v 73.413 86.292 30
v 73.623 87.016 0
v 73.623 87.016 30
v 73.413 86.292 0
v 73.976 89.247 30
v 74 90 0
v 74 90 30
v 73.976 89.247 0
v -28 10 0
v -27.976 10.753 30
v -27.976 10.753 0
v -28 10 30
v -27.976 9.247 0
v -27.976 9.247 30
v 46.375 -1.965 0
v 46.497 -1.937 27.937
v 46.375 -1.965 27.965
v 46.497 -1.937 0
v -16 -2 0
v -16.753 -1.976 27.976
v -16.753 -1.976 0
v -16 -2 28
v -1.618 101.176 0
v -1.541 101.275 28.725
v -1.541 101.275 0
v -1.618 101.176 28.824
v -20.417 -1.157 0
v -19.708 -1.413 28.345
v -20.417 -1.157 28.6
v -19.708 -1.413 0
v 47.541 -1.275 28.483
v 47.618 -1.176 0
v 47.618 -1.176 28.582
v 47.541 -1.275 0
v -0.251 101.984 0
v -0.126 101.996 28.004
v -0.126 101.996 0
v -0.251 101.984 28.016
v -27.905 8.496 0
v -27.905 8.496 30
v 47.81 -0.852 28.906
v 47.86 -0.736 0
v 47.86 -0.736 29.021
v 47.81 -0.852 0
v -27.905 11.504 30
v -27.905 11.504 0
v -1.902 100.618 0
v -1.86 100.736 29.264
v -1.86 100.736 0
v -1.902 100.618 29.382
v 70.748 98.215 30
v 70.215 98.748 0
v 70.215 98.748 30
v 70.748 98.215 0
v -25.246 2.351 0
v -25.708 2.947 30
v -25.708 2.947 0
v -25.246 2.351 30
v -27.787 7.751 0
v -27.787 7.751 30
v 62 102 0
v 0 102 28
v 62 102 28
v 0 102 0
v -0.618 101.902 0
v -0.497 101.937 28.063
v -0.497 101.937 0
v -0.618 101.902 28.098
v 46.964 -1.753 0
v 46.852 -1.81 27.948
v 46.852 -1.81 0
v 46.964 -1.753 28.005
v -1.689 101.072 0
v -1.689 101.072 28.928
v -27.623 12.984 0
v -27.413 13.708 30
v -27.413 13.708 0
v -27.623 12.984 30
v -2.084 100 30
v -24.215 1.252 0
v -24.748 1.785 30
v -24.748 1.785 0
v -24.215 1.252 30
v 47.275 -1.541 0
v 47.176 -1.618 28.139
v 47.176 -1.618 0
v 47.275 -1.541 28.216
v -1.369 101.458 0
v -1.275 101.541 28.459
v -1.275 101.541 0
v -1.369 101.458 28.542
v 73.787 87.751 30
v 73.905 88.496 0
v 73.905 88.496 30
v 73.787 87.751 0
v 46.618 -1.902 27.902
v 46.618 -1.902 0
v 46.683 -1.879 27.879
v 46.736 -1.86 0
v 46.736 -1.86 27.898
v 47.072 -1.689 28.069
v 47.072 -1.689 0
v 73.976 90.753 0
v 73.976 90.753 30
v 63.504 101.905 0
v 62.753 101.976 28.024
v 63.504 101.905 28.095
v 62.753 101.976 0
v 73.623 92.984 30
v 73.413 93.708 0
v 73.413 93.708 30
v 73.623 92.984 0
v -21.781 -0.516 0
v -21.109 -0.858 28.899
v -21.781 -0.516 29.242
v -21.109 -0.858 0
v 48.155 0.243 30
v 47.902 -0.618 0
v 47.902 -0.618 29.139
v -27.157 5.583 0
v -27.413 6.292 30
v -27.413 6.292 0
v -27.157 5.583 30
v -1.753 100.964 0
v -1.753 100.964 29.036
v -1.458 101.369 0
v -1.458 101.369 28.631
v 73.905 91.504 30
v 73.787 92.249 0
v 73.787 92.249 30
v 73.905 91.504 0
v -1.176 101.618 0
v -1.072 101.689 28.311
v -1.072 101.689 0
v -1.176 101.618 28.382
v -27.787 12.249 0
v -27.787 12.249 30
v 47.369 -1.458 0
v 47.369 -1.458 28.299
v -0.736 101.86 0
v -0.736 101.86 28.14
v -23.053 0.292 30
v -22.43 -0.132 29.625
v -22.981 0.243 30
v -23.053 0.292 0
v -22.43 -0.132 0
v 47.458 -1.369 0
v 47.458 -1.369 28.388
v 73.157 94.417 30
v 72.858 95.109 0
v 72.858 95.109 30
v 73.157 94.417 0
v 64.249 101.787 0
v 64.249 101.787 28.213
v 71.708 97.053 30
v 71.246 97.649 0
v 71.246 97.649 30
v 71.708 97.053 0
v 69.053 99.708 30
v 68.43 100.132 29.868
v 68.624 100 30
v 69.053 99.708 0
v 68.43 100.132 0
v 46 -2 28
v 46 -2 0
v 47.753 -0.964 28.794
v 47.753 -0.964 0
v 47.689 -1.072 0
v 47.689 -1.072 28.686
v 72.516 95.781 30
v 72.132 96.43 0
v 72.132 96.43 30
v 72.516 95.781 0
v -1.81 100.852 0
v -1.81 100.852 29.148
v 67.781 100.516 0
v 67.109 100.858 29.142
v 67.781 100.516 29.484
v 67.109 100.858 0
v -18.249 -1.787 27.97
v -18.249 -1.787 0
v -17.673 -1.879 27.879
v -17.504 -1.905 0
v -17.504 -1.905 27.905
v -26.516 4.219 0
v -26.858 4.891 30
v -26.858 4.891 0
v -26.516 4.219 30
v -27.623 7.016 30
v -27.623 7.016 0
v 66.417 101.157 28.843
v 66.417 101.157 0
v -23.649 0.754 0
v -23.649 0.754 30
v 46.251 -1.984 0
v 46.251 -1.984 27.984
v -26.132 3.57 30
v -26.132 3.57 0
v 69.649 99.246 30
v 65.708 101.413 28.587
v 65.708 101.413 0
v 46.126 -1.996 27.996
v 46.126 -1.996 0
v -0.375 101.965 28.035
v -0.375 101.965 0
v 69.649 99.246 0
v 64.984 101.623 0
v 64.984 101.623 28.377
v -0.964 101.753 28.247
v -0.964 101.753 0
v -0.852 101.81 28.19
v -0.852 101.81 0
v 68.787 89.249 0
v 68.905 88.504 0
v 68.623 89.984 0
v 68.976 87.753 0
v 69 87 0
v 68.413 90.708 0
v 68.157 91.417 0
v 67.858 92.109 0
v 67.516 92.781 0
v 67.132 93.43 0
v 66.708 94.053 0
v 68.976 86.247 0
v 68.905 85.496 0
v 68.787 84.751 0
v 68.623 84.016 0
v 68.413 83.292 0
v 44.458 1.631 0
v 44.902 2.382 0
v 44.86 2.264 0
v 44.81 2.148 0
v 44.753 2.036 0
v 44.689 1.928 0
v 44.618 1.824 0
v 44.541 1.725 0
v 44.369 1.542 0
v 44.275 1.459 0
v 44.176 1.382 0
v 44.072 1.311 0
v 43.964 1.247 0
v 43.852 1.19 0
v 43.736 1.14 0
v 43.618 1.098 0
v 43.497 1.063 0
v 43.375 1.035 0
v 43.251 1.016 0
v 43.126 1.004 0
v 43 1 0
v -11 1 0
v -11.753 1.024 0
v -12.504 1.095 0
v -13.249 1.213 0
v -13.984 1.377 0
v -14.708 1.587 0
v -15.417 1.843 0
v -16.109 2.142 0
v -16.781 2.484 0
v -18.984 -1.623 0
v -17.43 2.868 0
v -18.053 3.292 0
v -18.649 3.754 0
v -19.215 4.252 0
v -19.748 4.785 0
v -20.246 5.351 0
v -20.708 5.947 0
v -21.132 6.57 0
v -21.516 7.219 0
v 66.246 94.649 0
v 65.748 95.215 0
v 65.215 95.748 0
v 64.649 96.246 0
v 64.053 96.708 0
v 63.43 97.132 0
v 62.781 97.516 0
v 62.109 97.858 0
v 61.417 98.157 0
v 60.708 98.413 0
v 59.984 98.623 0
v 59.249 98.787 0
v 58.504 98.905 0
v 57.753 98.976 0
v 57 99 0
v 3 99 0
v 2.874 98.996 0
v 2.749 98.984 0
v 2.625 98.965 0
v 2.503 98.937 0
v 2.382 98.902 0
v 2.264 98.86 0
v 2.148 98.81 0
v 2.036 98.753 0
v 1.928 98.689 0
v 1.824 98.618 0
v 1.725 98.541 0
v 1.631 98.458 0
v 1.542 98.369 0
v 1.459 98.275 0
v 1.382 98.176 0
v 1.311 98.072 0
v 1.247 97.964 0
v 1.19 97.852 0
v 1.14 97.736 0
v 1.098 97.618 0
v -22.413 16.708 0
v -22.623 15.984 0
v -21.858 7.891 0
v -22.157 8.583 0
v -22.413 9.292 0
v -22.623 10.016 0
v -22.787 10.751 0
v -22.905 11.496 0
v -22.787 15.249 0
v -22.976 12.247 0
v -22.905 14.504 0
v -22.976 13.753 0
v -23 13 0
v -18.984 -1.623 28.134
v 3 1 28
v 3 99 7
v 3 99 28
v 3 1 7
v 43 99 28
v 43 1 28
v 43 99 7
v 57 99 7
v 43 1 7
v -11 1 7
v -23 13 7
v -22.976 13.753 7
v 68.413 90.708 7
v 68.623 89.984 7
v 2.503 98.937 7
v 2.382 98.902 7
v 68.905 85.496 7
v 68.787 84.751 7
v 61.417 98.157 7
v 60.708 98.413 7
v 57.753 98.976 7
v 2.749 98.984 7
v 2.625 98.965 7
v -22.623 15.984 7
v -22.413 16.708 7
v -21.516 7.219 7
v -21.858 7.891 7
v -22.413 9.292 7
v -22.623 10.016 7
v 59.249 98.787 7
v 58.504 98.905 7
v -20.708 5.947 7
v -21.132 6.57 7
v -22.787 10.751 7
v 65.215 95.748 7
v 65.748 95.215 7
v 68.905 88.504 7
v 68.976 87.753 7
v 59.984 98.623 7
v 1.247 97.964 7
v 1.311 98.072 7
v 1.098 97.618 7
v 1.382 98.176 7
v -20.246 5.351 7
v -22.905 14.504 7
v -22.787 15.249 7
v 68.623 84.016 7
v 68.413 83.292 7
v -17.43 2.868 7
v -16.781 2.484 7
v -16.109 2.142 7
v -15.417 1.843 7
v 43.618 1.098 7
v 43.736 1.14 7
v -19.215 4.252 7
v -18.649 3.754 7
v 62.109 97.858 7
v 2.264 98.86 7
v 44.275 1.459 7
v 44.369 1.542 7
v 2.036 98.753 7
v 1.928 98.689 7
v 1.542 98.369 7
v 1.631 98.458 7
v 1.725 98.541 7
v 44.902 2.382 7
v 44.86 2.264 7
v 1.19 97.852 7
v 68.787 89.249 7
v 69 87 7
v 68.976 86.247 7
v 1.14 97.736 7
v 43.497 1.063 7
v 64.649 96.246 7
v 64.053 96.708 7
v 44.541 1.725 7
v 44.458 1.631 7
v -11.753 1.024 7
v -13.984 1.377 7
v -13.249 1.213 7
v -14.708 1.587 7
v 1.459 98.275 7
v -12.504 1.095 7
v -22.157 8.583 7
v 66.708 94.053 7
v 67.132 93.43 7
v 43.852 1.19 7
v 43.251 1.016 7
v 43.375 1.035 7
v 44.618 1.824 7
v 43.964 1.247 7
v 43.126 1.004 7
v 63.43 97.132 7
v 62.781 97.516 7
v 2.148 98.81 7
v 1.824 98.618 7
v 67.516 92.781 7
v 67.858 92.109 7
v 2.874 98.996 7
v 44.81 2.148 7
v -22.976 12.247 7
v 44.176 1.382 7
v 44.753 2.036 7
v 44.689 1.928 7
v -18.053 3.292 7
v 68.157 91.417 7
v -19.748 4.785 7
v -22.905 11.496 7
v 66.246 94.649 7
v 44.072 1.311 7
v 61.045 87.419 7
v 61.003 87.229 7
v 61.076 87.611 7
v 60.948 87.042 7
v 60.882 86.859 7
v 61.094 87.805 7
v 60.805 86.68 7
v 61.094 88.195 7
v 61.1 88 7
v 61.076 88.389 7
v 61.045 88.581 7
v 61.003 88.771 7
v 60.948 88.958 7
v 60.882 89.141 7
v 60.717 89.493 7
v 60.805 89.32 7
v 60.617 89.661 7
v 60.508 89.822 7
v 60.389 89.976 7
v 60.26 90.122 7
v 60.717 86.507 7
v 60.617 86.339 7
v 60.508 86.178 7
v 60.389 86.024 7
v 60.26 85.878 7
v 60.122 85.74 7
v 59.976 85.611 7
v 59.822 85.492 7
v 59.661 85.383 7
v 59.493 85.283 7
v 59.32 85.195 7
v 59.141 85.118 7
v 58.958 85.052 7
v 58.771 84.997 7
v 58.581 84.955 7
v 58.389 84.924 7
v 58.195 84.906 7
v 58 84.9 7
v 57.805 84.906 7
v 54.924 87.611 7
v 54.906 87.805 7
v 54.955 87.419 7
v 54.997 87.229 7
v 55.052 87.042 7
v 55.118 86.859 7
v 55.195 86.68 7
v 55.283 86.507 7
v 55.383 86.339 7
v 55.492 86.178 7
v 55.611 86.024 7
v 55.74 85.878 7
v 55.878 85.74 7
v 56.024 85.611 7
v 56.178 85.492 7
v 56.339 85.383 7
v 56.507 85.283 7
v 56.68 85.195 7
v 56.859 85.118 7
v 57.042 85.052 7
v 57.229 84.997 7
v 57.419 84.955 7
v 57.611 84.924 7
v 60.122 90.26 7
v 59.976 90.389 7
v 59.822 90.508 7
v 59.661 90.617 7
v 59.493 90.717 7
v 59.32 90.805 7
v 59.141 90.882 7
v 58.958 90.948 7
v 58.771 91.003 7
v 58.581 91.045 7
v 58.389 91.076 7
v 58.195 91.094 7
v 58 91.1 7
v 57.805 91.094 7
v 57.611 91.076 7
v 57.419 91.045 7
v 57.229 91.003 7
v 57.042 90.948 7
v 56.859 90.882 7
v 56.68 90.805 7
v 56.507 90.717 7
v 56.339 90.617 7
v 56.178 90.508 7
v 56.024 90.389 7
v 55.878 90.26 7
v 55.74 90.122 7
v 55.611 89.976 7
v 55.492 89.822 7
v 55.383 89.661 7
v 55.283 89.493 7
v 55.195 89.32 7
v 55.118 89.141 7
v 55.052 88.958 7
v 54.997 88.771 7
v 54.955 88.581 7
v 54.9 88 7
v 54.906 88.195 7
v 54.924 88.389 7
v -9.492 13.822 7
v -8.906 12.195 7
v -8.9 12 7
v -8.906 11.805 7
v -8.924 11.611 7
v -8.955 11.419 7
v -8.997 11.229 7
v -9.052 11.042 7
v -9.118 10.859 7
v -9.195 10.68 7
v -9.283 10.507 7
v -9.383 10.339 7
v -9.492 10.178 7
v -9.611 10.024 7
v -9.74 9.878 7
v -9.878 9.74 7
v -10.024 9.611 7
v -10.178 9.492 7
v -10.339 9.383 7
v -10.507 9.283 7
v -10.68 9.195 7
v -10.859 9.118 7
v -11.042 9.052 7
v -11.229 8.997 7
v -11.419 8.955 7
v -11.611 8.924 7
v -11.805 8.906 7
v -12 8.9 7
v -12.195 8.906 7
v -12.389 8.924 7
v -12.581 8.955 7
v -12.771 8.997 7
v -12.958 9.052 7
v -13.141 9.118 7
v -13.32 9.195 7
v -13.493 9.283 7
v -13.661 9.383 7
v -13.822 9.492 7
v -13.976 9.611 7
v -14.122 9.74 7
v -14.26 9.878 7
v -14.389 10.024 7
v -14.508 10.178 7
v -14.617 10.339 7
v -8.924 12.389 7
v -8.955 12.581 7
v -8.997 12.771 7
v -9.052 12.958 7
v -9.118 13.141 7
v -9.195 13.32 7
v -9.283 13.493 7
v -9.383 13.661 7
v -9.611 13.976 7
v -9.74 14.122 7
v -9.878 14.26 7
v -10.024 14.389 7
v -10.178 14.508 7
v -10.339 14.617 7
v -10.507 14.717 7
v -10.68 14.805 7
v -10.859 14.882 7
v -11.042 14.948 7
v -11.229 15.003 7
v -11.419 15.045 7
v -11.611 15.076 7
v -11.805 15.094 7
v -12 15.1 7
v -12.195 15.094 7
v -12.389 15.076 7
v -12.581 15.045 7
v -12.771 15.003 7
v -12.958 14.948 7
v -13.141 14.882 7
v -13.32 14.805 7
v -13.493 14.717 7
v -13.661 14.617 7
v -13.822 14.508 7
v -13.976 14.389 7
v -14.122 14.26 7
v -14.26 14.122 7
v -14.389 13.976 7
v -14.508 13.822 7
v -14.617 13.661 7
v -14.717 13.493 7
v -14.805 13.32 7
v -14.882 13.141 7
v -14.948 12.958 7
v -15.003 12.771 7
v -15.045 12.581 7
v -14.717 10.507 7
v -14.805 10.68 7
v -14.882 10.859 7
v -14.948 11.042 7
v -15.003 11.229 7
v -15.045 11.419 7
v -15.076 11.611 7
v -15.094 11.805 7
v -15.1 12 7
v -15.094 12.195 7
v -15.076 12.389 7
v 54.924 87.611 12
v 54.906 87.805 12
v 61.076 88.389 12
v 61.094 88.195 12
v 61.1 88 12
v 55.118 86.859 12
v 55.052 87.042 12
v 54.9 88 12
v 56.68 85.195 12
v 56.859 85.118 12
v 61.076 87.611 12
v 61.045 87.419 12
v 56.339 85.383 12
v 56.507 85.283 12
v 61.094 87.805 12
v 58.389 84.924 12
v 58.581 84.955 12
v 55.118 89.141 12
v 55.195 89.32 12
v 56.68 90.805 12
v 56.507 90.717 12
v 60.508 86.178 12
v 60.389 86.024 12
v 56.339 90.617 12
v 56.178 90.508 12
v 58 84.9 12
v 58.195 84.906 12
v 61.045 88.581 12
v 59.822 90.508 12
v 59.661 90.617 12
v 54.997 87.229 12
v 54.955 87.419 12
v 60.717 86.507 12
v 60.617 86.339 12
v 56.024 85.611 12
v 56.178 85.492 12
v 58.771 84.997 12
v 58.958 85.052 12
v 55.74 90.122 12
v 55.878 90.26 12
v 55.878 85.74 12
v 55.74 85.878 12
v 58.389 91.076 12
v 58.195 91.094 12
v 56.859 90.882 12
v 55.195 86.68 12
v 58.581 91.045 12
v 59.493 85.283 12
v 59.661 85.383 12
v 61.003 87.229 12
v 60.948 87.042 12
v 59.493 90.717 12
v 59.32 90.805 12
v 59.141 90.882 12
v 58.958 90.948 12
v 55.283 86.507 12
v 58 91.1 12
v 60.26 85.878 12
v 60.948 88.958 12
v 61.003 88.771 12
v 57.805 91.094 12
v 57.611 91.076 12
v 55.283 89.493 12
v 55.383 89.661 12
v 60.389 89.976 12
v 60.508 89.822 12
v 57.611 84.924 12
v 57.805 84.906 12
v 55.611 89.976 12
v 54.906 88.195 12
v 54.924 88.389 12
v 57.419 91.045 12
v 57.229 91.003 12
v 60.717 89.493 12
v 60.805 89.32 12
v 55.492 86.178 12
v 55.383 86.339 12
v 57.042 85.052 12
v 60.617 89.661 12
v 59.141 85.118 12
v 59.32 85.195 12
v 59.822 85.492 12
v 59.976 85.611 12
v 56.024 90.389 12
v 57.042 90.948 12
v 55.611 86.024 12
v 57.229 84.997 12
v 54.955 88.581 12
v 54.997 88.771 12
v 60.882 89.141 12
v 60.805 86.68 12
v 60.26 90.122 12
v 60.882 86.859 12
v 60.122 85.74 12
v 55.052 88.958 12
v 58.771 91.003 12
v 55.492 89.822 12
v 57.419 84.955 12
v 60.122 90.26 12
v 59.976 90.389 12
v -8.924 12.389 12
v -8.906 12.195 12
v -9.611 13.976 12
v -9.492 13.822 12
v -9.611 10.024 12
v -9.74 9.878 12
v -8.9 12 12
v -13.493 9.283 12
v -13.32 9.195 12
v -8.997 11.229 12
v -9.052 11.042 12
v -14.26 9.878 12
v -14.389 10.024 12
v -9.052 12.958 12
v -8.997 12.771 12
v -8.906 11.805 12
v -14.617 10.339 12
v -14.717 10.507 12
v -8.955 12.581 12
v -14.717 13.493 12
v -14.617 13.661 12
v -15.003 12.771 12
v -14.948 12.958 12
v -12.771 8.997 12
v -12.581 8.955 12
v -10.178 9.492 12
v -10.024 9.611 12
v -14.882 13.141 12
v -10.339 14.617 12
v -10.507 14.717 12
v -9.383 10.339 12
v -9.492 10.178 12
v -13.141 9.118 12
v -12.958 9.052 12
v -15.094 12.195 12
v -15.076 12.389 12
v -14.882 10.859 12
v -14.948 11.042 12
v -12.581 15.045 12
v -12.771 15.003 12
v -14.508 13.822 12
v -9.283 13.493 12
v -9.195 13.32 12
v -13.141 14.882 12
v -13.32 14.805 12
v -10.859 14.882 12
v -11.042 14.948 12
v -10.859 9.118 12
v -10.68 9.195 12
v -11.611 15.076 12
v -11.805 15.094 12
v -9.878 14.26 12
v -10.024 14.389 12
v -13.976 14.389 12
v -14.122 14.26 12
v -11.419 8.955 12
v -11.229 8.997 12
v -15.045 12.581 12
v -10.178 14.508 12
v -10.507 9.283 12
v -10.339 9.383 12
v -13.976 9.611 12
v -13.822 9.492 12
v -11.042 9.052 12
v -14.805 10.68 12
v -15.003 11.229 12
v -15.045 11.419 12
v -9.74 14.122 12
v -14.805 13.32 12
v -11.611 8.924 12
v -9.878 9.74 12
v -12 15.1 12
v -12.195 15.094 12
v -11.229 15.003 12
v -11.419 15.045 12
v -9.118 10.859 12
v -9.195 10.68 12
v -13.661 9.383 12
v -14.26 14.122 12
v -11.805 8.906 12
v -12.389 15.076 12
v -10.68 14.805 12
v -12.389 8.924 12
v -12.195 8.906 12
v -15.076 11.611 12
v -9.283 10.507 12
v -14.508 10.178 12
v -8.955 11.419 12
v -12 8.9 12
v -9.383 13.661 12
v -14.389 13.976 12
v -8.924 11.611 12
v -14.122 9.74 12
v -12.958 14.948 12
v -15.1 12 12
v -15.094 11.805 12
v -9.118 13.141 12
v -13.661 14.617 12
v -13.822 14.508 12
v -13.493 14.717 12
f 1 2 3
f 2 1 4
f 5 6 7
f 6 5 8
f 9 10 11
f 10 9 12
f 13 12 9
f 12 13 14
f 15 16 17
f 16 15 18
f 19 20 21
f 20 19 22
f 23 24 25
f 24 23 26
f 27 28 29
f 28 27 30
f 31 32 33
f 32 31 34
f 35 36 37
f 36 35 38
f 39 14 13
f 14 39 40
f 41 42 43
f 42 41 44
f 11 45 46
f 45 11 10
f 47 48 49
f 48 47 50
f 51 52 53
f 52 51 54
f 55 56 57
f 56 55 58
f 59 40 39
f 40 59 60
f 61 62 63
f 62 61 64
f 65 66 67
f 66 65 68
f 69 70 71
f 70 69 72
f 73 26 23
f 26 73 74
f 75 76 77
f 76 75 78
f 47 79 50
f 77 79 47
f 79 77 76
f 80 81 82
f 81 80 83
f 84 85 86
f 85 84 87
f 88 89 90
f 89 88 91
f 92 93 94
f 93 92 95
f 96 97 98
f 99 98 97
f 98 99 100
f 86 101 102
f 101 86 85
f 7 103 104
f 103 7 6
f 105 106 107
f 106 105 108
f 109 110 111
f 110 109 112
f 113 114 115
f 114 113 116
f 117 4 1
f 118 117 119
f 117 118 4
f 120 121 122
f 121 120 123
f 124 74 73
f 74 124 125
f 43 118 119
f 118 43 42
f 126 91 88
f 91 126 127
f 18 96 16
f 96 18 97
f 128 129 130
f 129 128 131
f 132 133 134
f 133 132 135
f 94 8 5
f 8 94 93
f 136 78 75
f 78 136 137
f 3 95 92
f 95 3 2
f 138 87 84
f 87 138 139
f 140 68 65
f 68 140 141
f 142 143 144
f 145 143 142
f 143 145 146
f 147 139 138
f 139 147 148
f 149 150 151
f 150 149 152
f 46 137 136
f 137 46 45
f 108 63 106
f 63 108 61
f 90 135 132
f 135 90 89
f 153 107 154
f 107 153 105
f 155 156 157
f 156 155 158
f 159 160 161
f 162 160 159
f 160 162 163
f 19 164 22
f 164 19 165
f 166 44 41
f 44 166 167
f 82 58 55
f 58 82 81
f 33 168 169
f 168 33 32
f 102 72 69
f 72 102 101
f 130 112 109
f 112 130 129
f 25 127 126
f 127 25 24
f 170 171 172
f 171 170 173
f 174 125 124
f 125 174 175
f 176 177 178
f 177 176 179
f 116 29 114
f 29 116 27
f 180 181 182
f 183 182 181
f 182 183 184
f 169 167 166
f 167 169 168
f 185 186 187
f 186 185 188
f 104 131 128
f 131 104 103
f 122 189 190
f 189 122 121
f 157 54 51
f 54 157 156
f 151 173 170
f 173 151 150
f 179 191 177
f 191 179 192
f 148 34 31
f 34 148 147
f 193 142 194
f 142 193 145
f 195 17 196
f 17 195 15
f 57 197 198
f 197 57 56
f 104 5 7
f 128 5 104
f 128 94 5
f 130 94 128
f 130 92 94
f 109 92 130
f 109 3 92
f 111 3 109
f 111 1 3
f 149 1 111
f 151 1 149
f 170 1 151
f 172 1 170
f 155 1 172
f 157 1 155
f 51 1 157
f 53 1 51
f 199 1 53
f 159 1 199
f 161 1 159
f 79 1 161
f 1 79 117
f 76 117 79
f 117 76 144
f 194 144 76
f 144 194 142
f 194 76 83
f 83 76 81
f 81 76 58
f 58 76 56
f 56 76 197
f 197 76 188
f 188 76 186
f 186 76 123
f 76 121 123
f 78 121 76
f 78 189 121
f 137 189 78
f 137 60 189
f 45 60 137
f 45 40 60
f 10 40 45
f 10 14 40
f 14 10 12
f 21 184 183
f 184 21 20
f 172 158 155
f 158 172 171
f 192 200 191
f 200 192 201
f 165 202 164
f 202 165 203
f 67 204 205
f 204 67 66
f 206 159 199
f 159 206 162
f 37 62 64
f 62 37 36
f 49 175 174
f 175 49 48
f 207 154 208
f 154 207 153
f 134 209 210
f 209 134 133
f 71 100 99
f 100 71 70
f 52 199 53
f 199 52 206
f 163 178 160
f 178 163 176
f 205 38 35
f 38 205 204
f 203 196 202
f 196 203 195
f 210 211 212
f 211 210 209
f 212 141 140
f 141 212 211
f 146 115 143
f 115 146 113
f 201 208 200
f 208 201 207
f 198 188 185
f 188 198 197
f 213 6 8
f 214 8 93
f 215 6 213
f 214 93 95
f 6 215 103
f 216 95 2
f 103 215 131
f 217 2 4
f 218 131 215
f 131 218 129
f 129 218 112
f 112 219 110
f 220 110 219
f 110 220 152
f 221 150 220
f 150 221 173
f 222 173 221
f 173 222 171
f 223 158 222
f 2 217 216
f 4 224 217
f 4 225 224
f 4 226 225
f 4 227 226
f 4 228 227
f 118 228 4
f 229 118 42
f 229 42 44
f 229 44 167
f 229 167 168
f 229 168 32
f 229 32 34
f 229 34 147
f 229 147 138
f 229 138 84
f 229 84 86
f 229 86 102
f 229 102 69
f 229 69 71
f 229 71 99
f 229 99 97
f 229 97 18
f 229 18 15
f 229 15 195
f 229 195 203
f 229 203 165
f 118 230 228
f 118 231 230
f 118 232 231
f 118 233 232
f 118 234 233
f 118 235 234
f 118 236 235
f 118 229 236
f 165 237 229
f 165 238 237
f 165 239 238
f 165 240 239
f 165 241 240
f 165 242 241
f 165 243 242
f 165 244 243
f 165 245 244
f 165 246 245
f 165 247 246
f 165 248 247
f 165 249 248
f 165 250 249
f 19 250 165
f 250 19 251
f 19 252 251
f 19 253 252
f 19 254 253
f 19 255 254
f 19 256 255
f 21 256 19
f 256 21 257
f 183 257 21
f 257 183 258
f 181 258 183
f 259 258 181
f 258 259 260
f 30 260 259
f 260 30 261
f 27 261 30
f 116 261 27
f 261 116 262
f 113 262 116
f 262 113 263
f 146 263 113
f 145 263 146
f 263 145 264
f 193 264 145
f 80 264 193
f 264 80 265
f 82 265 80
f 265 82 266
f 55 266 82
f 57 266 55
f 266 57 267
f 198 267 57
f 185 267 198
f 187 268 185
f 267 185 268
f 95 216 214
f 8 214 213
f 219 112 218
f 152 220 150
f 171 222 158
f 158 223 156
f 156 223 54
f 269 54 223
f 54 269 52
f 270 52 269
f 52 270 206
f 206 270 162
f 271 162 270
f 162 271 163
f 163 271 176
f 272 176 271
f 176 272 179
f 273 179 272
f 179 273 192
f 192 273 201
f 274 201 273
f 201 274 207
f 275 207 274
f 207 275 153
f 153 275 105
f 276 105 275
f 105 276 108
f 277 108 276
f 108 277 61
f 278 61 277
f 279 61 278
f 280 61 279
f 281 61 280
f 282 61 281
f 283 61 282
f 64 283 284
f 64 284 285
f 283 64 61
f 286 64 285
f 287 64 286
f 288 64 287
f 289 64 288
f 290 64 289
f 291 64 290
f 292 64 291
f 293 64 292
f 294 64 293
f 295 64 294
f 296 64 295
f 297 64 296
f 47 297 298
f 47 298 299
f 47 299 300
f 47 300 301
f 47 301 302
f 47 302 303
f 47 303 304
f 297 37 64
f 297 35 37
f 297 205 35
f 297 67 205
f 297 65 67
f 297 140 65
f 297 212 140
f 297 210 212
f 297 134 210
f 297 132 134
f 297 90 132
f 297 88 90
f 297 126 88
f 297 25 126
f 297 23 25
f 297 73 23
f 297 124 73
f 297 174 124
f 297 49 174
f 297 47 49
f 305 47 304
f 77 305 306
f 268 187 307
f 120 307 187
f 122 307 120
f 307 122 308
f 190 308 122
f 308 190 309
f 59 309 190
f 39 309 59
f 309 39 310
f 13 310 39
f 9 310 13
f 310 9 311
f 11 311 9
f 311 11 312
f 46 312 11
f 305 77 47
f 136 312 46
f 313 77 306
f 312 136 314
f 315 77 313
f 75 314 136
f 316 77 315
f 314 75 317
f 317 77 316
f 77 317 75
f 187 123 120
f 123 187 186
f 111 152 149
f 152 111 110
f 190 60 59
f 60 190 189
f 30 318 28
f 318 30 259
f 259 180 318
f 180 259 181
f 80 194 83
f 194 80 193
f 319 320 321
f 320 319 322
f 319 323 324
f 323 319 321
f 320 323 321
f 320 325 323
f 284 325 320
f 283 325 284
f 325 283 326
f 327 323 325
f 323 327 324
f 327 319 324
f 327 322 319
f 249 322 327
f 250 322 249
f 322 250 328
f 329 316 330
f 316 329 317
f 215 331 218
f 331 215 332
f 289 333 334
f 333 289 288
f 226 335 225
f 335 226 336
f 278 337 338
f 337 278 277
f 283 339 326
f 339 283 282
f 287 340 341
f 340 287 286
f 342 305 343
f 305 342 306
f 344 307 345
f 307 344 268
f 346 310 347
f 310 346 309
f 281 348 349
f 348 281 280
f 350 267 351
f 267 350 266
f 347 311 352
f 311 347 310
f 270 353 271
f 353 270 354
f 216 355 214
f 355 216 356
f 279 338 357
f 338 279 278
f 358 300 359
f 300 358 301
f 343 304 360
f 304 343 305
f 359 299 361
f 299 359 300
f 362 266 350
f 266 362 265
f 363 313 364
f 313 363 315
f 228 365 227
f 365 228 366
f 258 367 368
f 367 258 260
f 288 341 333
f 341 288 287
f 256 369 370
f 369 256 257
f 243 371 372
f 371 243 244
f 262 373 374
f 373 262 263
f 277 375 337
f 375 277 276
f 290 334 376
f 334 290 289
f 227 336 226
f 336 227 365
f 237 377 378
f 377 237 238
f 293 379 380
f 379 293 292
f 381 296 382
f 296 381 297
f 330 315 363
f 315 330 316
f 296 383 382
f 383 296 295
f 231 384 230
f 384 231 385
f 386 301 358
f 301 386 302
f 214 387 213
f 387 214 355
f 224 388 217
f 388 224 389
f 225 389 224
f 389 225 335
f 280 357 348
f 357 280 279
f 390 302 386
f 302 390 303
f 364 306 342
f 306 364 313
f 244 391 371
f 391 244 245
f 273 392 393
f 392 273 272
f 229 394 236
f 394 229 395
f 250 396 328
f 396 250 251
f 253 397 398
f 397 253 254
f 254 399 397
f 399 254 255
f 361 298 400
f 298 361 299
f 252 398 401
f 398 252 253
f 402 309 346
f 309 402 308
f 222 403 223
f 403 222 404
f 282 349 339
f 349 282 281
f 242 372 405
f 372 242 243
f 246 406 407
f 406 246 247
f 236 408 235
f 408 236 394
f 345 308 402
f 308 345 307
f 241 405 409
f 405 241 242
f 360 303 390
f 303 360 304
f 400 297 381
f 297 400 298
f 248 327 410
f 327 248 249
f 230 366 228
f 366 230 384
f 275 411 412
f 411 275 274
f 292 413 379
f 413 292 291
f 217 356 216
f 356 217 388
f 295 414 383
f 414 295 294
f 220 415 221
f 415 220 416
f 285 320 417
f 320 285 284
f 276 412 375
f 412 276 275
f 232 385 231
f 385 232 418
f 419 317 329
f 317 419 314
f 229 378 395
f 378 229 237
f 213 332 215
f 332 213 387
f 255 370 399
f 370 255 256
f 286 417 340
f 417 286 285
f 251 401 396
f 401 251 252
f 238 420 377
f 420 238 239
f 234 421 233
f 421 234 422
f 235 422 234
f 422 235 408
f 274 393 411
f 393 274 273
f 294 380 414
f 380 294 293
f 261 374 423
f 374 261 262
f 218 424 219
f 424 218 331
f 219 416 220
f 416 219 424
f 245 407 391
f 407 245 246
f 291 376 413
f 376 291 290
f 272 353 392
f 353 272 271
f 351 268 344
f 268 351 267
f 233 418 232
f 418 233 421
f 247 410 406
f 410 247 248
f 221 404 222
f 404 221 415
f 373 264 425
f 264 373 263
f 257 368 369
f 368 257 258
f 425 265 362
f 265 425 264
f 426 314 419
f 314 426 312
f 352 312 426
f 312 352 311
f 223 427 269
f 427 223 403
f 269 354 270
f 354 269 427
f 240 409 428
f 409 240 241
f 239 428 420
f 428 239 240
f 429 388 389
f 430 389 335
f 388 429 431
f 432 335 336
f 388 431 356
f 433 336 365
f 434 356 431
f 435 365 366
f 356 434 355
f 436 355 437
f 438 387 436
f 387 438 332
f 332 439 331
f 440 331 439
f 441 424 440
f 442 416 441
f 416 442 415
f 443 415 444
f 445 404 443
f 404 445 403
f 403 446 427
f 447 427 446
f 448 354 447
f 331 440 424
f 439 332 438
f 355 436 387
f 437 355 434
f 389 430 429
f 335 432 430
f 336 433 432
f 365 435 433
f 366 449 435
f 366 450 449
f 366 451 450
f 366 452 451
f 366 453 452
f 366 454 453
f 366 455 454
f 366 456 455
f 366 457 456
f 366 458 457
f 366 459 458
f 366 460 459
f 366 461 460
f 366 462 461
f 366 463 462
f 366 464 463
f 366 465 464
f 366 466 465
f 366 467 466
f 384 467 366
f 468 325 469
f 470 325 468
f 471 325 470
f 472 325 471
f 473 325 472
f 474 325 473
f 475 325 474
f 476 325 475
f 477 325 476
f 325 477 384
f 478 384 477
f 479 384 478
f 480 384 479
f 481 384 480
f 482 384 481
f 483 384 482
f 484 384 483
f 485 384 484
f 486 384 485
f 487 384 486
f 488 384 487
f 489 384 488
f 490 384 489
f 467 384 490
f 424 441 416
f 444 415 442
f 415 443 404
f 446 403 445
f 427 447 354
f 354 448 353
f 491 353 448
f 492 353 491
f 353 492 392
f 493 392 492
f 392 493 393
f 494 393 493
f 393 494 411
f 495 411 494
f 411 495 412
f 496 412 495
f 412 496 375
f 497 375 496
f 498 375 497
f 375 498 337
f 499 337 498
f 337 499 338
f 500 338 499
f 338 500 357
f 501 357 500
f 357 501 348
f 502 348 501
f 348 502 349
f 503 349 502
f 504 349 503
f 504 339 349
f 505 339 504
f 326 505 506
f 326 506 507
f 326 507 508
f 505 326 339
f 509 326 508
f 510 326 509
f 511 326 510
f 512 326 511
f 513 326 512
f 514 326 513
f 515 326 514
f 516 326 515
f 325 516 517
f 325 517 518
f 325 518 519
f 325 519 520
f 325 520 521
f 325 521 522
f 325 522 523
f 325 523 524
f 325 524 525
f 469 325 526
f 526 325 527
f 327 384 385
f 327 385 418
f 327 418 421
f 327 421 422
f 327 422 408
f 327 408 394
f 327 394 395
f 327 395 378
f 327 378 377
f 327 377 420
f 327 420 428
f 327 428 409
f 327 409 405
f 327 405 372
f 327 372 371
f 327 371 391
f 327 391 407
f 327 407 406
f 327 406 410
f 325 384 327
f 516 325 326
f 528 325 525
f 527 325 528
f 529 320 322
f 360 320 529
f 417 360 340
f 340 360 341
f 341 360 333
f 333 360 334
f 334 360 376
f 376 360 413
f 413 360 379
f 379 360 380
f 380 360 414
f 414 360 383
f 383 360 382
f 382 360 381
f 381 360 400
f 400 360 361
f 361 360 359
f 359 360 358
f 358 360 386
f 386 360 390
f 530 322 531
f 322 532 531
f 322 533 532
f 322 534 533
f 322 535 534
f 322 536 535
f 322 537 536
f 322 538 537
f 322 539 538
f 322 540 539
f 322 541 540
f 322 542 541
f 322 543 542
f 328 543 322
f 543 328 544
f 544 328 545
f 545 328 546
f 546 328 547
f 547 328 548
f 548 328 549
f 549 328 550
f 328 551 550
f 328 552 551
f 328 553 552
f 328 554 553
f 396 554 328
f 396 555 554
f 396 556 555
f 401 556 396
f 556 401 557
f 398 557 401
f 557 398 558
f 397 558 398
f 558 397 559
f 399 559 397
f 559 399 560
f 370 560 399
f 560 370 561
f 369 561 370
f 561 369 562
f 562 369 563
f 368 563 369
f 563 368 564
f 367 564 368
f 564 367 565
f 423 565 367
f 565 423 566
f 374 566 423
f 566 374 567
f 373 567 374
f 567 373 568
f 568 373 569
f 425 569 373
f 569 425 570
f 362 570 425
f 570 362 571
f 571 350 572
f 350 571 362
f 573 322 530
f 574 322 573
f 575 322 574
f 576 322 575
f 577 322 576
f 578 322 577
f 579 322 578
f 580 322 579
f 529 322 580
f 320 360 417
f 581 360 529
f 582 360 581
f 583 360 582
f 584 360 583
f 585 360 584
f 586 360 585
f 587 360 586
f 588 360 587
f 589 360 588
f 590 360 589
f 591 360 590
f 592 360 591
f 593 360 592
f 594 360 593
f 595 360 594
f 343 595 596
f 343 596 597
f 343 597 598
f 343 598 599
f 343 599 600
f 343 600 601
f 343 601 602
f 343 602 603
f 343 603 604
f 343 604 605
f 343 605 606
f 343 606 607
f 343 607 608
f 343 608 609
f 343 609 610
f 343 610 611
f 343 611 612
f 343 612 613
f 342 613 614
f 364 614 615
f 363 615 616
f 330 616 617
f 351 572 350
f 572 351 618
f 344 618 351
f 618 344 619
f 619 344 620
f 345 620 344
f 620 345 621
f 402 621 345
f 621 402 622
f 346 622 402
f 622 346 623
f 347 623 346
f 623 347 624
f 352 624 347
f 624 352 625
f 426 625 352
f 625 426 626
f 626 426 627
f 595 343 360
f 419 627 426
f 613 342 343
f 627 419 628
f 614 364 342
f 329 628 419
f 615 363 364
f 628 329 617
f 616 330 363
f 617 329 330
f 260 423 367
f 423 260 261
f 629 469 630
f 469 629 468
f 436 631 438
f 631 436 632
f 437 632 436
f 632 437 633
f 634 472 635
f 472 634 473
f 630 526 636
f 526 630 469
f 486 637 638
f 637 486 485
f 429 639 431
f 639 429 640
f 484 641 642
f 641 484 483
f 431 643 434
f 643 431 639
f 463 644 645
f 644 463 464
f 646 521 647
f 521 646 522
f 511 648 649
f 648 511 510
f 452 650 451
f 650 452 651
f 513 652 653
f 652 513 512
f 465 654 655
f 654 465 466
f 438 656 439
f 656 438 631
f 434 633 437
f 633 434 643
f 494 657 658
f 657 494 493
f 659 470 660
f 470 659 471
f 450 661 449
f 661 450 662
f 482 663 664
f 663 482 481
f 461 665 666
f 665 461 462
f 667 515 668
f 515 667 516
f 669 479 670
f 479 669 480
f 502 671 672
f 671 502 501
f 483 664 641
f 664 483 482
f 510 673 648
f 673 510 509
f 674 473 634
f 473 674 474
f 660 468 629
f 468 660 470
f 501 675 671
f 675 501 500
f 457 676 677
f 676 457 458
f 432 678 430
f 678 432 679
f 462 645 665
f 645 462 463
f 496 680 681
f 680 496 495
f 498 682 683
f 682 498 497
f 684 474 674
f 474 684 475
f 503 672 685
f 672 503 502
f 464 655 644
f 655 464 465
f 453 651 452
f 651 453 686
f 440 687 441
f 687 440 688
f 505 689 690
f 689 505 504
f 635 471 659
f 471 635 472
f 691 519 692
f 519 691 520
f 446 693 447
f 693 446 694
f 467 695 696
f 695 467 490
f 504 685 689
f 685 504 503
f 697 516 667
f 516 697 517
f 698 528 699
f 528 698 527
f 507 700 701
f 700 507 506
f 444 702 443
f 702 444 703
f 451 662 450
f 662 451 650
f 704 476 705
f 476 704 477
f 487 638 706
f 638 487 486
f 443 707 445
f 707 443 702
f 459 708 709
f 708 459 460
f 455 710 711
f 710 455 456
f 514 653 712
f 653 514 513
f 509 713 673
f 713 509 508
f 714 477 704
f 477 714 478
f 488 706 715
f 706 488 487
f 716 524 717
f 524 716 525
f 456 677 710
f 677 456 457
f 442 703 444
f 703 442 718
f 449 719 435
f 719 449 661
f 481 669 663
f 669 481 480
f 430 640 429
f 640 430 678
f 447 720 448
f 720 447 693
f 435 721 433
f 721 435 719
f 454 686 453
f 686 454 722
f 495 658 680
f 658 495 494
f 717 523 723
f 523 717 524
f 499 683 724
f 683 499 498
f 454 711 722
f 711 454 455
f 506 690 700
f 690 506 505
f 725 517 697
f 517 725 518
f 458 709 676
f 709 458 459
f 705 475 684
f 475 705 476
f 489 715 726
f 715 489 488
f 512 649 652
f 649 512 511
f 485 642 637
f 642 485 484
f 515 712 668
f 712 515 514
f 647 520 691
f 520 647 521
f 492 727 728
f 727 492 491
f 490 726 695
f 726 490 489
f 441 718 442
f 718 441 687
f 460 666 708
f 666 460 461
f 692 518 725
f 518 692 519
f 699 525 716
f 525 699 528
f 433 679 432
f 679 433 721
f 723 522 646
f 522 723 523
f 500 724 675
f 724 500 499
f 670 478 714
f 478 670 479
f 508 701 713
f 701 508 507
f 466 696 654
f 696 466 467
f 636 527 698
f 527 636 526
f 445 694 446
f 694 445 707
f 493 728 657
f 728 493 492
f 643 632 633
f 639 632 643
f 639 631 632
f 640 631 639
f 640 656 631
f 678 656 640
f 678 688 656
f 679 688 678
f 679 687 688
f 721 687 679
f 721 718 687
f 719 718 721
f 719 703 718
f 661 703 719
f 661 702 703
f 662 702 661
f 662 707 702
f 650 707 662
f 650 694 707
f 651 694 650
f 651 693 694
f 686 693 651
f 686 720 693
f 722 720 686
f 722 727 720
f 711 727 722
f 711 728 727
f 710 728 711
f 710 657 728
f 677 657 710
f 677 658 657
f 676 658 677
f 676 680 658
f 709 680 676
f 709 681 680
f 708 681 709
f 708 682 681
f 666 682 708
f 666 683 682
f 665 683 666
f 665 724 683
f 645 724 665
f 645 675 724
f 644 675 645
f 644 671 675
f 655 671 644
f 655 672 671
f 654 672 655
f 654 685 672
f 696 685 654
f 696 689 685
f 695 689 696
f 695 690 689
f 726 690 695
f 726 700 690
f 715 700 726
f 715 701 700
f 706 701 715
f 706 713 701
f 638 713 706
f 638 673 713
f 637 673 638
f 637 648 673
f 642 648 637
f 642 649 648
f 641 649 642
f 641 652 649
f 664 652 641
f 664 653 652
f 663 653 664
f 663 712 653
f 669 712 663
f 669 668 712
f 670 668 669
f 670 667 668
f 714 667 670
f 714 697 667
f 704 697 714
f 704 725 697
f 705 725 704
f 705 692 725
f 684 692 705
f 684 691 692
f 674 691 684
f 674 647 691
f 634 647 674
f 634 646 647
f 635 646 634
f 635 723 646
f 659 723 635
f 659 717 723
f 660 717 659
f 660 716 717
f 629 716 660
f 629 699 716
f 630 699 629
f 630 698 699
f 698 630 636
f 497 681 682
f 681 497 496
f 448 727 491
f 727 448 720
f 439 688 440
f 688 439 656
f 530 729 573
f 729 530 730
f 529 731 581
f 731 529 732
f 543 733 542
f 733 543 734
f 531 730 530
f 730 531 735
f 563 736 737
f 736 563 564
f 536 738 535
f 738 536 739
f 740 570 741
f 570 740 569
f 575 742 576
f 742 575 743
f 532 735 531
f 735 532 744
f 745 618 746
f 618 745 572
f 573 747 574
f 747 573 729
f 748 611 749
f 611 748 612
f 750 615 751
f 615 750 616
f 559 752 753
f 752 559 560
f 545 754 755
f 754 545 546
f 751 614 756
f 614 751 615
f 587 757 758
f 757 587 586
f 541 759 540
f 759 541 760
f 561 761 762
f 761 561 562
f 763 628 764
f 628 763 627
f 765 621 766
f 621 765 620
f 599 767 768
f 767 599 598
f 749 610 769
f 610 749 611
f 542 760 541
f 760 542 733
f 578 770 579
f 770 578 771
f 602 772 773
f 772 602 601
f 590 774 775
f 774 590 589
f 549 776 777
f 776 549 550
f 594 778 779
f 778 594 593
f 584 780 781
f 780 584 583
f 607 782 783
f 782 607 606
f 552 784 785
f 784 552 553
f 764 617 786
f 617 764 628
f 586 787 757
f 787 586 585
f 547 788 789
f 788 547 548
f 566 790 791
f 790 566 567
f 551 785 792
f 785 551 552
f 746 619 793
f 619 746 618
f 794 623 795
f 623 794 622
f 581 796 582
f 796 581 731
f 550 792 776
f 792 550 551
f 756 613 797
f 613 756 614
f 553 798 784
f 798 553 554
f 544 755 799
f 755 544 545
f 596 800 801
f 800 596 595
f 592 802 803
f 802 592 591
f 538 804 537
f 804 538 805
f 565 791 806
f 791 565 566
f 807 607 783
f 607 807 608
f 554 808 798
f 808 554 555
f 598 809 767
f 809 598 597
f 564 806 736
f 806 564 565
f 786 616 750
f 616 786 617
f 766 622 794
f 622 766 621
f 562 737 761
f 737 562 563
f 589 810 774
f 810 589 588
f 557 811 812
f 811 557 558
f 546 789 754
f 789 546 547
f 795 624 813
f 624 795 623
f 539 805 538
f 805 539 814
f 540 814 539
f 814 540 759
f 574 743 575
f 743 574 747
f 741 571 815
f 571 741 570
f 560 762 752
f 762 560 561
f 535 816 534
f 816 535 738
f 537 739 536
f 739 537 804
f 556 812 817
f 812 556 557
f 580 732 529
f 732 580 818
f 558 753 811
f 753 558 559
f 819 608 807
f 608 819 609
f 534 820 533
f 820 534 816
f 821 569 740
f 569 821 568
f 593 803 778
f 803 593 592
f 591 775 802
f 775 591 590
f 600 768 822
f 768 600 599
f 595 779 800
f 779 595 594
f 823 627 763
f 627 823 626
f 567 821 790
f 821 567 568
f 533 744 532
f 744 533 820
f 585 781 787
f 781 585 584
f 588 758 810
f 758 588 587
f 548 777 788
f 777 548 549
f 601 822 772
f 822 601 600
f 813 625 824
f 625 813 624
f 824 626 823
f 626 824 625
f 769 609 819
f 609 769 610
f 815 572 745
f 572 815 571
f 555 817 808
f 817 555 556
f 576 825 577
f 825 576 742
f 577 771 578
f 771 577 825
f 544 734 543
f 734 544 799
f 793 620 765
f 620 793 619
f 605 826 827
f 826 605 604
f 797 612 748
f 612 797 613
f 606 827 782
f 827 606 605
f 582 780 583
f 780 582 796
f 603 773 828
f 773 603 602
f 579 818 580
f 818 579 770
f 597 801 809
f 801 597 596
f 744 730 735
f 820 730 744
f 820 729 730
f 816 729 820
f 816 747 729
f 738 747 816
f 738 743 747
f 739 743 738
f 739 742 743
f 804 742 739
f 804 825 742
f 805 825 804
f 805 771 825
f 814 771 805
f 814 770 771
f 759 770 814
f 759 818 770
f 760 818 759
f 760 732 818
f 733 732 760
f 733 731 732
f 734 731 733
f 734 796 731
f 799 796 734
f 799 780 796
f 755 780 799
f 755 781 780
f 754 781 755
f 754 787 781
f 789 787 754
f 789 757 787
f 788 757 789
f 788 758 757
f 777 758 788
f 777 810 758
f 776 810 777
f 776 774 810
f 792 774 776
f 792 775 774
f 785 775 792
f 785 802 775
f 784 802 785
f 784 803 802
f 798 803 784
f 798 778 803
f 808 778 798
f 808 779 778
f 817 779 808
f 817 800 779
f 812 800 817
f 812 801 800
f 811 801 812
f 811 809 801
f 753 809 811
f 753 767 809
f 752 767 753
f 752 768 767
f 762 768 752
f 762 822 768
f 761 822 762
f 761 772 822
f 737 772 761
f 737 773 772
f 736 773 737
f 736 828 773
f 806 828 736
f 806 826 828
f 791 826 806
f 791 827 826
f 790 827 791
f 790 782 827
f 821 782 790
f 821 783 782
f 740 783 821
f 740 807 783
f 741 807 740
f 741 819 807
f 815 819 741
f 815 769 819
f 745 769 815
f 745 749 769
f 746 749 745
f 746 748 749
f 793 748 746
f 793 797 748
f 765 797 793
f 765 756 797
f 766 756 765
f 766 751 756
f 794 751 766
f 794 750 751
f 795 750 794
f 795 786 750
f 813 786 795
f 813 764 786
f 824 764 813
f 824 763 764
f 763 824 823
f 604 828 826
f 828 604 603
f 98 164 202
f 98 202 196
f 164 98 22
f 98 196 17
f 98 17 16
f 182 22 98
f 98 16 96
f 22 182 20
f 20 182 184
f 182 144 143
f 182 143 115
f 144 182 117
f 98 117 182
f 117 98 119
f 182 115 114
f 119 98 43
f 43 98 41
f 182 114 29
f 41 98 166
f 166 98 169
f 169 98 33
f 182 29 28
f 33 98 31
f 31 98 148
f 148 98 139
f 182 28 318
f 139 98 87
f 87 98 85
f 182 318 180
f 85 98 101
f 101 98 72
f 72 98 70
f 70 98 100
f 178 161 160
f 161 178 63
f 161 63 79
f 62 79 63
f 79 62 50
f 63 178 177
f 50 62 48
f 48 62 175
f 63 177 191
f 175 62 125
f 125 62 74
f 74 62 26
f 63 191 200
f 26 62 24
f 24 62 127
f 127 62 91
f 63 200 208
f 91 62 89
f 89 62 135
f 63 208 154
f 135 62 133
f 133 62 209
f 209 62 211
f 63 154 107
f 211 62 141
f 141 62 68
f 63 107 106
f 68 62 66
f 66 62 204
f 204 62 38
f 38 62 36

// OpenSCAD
difference(){
    // ベース部分
    linear_extrude(30){
        hull(){
            // 小丸
            translate([46,0,0]) circle(2,$fn=100);
            translate([0,100,0]) circle(2,$fn=100);
            // 大丸
            translate([62,90,0]) circle(12,$fn=100);
            translate([-16,10,0]) circle(12,$fn=100);
        }
    }
    
    // 中身のスペース
    linear_extrude(28) translate([3,1,2]) square([40,98]);
    
    // 蓋を入れるスペース
    linear_extrude(7) translate([1,1,0]) {
        hull(){
            // 1 mm 短いやつ
            // 小丸
            translate([42,2,0]) circle(2,$fn=100);
            translate([2,96,0]) circle(2,$fn=100);
            // 大丸
            translate([56,86,0]) circle(12,$fn=100);
            translate([-12,12,0]) circle(12,$fn=100);
        }
    }
    
    // 磁石埋め込み穴
    translate([58,88,7]) linear_extrude(5) circle(3.1,$fn=100);
    translate([-12,12,7]) linear_extrude(5) circle(3.1,$fn=100);
    
    // 剥すやつ
    translate([-30,-4,30]) rotate([45,0,0]) rotate([0,90,0]) linear_extrude(100) square([3,3]);
    translate([-30,100,30]) rotate([45,0,0]) rotate([0,90,0]) linear_extrude(100) square([3,3]);
}
